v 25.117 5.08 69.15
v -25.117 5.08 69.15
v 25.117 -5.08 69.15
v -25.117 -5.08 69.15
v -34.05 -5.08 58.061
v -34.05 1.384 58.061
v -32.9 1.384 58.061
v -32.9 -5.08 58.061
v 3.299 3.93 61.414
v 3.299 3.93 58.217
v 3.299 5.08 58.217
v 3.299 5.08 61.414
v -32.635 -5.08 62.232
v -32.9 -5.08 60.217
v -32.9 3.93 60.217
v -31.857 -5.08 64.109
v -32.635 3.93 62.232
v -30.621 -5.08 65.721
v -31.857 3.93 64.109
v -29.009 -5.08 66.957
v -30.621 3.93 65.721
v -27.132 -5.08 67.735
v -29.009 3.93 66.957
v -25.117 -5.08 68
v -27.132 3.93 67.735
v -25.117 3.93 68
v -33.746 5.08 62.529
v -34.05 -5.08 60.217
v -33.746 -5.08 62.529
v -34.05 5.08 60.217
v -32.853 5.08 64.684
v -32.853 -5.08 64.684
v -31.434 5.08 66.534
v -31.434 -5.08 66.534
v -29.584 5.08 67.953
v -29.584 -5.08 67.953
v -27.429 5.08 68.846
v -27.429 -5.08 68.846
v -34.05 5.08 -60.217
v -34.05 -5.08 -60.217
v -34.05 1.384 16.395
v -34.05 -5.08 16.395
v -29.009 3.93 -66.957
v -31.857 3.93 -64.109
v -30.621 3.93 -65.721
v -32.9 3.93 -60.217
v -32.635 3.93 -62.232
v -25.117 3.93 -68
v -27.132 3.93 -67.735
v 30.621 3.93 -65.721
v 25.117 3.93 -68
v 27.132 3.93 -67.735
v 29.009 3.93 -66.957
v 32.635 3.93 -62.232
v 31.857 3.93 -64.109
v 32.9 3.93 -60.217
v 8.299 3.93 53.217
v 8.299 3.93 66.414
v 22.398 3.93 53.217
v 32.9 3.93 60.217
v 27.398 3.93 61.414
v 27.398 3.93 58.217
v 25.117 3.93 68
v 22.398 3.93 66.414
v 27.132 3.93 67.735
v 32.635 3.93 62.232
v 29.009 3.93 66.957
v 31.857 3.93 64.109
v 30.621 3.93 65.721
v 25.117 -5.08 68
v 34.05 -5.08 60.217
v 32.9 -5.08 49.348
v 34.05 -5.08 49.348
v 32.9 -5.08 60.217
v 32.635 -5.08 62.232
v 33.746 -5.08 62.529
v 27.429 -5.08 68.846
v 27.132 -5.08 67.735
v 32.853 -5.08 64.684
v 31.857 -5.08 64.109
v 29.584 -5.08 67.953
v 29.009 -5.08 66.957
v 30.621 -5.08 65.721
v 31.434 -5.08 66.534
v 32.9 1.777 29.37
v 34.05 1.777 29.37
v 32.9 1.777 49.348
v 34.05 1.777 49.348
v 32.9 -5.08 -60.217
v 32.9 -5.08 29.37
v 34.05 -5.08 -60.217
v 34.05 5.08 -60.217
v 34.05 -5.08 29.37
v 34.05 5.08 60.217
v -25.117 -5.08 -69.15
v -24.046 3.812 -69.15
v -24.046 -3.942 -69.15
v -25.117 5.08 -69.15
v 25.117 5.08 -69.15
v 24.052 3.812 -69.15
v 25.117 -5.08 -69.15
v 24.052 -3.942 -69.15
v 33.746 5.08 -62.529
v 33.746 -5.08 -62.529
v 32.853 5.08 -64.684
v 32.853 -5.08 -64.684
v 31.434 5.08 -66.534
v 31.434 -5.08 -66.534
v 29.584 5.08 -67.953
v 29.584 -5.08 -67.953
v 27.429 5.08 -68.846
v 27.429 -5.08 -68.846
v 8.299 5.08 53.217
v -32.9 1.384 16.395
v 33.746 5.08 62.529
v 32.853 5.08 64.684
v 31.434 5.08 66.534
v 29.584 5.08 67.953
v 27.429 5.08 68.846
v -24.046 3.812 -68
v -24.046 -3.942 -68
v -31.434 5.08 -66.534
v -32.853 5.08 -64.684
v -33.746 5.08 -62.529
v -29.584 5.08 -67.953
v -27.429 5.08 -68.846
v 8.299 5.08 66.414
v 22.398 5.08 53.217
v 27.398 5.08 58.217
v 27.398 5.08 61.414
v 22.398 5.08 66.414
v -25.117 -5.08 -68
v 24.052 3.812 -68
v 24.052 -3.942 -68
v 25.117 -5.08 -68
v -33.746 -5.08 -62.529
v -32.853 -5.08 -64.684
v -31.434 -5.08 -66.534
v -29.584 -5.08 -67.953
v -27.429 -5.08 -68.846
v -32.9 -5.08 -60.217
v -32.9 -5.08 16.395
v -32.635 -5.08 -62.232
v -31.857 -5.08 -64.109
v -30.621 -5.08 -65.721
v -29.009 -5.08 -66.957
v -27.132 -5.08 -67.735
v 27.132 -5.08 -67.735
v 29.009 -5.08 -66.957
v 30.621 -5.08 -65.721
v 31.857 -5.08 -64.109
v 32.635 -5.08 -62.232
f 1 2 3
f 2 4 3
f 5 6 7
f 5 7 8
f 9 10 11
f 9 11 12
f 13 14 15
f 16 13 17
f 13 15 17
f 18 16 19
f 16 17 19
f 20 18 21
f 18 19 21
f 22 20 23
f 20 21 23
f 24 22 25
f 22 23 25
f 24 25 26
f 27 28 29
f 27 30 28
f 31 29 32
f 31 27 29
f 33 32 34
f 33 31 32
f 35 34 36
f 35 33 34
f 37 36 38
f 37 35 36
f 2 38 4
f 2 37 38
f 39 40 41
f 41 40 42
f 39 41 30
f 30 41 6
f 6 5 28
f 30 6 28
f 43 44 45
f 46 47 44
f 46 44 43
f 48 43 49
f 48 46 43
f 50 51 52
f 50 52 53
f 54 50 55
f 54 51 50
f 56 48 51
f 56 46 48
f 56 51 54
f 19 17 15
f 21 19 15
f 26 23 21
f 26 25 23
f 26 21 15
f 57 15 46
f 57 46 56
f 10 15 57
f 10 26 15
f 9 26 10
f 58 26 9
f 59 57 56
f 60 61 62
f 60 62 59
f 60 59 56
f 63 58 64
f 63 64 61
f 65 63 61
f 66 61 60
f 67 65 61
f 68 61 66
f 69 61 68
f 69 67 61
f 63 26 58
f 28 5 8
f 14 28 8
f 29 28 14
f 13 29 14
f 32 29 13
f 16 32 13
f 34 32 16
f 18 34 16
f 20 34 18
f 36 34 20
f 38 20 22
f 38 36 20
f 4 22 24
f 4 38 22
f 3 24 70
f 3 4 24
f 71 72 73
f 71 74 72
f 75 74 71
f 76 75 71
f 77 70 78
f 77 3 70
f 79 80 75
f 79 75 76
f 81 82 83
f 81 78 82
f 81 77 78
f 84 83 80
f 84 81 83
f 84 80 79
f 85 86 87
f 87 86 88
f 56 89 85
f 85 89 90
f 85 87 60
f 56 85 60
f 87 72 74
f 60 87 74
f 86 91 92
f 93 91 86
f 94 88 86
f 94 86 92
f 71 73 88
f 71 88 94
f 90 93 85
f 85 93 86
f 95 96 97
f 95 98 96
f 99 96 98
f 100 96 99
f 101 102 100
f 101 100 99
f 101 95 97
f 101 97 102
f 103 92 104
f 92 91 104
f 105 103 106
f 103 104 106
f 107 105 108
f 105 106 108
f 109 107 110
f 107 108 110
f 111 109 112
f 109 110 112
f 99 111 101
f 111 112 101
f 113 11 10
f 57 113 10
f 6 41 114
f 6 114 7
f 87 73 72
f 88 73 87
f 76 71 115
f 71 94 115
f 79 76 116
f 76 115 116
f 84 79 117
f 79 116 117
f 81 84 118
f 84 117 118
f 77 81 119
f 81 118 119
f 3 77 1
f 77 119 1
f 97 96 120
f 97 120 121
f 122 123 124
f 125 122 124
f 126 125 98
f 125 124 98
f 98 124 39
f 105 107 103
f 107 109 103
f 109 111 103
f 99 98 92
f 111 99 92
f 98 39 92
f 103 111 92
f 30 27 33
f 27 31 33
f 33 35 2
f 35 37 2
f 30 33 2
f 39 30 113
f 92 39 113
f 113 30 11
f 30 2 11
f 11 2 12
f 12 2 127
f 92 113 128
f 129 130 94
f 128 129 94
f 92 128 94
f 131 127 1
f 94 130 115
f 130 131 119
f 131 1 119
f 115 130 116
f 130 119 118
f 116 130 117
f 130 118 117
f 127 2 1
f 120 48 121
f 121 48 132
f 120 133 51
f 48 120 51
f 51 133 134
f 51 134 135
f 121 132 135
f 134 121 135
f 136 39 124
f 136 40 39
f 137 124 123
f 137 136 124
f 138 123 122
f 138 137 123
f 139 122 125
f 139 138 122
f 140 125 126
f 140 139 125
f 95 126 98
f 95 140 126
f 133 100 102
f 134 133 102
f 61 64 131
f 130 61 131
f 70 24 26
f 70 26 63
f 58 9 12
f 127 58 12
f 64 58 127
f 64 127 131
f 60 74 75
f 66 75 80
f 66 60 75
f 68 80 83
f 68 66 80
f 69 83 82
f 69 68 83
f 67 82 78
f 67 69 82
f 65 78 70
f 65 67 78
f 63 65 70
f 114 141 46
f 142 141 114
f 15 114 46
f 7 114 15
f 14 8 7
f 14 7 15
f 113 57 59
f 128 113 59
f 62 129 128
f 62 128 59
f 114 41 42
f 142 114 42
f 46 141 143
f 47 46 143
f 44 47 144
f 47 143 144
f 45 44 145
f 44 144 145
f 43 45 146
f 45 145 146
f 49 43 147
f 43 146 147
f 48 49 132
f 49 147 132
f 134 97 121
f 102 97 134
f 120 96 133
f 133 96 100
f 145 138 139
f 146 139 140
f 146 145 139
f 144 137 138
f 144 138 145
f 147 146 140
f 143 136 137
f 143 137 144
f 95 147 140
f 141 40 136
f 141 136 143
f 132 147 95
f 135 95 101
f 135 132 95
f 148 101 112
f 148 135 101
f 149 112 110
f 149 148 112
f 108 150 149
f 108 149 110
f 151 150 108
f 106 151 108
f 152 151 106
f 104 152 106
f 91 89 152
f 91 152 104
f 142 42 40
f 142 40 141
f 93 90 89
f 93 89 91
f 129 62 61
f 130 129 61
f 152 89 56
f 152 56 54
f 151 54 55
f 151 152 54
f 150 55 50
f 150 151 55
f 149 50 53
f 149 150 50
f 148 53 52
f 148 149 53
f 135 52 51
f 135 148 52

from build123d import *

# Parameters (mm, degrees)
F0_W      = 68.1
F0_H      = 138.3
F1_DEPTH  = 5.08
F2_R      = 8.93259
F3_T      = -1.15
F4_W      = 24.09836
F4_H      = 13.196725
F5_DEPTH  = 12.5
F6_W      = 48.097777
F6_H      = 7.753484
F7_DEPTH  = 12.5
F8_W      = 10.118616
F8_H      = 41.666549
F9_DEPTH  = 12.5
F10_W     = 6.856616
F10_H     = 19.977162
F11_DEPTH = 12.5
F12_SIZE  = 5


with BuildPart() as f1:
    # F0 (on Front) → F1 (new body, symmetric)
    with BuildSketch(Plane.XZ):
        Rectangle(F0_W, F0_H)
    extrude(amount=F1_DEPTH, both=True)

    # F2
    f2_edges = [f1.edges().sort_by_distance(p)[0] for p in [
        (-34.05, 0, 69.15),
        (34.05, 0, 69.15),
        (34.05, 0, -69.15),
        (-34.05, 0, -69.15),
    ]]
    fillet(f2_edges, radius=F2_R)

    # F3
    f3_openings = [f1.faces().sort_by_distance(p)[0] for p in [
        (0, -5.08, 0),
    ]]
    offset(amount=F3_T, openings=f3_openings)

    # F4 (on face) → F5 (cut, symmetric)
    with BuildSketch(Plane.XZ):
        with Locations((15.348363, 59.815576)):
            Rectangle(F4_W, F4_H)
    extrude(amount=F5_DEPTH, both=True, mode=Mode.SUBTRACT)

    # F6 (on face) → F7 (cut, symmetric)
    with BuildSketch(Plane(origin=(0, 0, -69.15), x_dir=(1, 0, 0), z_dir=(0, 0, -1))):
        with Locations((0.003194, 0.064824)):
            Rectangle(F6_W, F6_H)
    extrude(amount=F7_DEPTH, both=True, mode=Mode.SUBTRACT)

    # F8 (on face) → F9 (cut, symmetric)
    with BuildSketch(Plane(origin=(-34.05, 0, 0), x_dir=(0, -1, 0), z_dir=(-1, 0, 0))):
        with Locations((3.675346, 37.227889)):
            Rectangle(F8_W, F8_H)
    extrude(amount=F9_DEPTH, both=True, mode=Mode.SUBTRACT)

    # F10 (on face) → F11 (cut, symmetric)
    with BuildSketch(Plane.YZ.offset(34.05)):
        with Locations((-1.651692, 39.359077)):
            Rectangle(F10_W, F10_H)
    extrude(amount=F11_DEPTH, both=True, mode=Mode.SUBTRACT)

    # F12
    f12_edges = [f1.edges().sort_by_distance(p)[0] for p in [
        (3.299183, 4.505, 66.413939),
        (27.397543, 4.505, 66.413939),
        (27.397543, 4.505, 53.217214),
        (3.299183, 4.505, 53.217214),
    ]]
    chamfer(f12_edges, length=F12_SIZE)


solid = f1.part
